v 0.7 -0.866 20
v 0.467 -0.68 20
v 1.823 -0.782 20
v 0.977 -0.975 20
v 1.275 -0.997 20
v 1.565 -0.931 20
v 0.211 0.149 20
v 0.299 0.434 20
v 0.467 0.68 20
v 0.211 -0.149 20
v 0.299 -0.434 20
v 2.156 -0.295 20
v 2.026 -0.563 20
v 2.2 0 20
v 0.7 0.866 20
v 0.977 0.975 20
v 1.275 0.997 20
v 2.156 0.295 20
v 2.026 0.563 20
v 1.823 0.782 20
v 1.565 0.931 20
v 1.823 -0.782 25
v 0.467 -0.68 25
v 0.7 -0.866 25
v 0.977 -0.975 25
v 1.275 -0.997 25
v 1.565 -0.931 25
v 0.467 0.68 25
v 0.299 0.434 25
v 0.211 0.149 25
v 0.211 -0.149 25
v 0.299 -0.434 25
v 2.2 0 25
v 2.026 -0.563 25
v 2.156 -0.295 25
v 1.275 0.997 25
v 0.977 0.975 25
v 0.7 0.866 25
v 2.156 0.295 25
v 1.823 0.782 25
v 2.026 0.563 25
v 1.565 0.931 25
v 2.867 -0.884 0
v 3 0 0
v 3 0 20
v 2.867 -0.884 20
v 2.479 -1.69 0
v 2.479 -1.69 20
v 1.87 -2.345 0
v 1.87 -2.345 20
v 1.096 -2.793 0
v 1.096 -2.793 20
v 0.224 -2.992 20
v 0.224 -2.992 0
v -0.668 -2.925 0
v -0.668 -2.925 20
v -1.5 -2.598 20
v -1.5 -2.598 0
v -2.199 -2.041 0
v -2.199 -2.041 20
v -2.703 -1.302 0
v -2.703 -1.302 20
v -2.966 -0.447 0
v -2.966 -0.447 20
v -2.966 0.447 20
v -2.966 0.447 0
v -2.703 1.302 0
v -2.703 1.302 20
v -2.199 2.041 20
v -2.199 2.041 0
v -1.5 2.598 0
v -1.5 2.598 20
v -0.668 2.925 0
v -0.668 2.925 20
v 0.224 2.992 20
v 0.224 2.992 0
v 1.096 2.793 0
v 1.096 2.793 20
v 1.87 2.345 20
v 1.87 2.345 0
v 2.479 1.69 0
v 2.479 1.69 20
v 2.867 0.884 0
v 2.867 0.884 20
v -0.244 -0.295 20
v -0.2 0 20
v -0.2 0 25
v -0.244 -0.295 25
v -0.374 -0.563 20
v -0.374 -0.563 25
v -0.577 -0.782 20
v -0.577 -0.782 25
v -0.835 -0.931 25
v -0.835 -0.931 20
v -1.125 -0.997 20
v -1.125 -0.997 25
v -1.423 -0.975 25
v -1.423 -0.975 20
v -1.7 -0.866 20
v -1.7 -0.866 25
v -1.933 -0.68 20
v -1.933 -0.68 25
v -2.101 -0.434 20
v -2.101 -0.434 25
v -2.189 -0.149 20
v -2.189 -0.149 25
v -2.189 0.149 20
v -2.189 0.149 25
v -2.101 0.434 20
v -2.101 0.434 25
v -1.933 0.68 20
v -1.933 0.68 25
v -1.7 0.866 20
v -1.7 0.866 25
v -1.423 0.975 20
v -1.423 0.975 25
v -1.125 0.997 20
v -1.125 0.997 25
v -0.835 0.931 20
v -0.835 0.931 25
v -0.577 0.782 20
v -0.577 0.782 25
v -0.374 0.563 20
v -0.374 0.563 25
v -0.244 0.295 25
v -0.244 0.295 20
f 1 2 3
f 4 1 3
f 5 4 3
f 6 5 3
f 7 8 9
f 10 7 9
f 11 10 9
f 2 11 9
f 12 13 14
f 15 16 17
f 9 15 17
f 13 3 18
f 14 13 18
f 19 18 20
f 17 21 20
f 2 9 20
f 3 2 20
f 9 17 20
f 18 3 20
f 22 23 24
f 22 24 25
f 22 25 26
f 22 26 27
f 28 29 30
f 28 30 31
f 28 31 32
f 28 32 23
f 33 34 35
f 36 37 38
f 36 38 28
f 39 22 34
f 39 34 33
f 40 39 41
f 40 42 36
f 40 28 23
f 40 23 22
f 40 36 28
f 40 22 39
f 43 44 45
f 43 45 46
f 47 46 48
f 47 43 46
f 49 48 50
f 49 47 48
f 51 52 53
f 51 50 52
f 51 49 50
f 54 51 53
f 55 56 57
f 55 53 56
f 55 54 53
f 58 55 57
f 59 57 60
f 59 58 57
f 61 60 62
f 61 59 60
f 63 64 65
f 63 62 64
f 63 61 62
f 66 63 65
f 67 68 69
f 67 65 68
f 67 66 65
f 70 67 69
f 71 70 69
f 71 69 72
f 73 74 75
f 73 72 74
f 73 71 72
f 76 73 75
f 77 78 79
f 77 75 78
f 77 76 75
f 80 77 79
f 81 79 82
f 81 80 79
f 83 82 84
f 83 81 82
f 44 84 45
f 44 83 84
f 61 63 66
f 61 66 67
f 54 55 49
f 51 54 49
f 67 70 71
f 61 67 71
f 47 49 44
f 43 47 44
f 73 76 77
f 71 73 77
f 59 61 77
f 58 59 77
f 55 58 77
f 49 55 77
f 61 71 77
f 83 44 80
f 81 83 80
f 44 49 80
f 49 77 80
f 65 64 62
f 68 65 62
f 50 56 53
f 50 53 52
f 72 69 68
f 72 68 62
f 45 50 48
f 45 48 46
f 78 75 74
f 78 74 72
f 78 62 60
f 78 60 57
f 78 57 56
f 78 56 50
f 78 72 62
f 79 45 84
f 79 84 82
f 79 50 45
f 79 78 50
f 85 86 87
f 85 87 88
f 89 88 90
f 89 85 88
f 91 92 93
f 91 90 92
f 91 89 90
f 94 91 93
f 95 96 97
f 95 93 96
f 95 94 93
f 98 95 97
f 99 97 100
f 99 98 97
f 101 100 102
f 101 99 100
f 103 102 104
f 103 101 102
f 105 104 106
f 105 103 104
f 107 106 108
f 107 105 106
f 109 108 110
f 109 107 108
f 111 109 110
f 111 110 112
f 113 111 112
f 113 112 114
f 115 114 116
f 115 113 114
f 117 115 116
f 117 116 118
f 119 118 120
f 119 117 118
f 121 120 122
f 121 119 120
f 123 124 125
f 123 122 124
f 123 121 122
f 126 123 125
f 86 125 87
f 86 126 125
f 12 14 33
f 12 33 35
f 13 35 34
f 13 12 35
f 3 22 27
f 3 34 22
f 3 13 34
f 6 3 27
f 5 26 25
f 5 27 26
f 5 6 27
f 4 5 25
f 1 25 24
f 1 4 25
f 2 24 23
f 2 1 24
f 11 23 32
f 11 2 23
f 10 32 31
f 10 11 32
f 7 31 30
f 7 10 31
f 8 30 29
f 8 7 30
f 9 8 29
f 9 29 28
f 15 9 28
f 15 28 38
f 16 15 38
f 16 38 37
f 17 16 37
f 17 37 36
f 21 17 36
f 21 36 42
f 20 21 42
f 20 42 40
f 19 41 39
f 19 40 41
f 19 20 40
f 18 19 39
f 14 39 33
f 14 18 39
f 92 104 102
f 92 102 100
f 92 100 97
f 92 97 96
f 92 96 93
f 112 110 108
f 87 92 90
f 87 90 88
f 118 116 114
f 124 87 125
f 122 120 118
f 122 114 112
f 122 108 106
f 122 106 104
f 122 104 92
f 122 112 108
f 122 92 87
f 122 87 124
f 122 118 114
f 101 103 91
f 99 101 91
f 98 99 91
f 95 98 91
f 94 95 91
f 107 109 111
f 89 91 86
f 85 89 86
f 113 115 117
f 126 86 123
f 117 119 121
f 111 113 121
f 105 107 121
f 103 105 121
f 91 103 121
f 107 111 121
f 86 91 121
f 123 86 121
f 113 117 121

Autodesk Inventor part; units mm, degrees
ref_plane "YZ Plane" through (0, 0, 0) normal (1, 0, 0) x (0, 1, 0)
ref_plane "XZ Plane" through (0, 0, 0) normal (0, 1, 0) x (-1, 0, 0)
ref_plane "XY Plane" through (0, 0, 0) normal (0, 0, 1) x (1, 0, 0)
sketch "Sketch1" plane through (0, 0, 0) normal (0, 0, 1) x (1, 0, 0)
  circle A0 centre (0, 0) radius 3 projected
extrude "Extrusion1" add sketch "Sketch1" along normal blind 20
sketch "Sketch2" plane through (0, 0, 20) normal (0, 0, 1) x (1, 0, 0)
  circle A0 centre (0, 0) radius 3 projected
  circle A1 centre (-1.2, 0) radius 1
  circle A2 centre (1.2, 0) radius 1
  dimension "d2" = 2
  dimension "d3" = 2
  dimension "d4" = 1.2
  dimension "d5" = 1.2
extrude "Extrusion2" add sketch "Sketch2" along normal blind 5 separate body contours A1 | A2
properties material "Stainless Steel"
